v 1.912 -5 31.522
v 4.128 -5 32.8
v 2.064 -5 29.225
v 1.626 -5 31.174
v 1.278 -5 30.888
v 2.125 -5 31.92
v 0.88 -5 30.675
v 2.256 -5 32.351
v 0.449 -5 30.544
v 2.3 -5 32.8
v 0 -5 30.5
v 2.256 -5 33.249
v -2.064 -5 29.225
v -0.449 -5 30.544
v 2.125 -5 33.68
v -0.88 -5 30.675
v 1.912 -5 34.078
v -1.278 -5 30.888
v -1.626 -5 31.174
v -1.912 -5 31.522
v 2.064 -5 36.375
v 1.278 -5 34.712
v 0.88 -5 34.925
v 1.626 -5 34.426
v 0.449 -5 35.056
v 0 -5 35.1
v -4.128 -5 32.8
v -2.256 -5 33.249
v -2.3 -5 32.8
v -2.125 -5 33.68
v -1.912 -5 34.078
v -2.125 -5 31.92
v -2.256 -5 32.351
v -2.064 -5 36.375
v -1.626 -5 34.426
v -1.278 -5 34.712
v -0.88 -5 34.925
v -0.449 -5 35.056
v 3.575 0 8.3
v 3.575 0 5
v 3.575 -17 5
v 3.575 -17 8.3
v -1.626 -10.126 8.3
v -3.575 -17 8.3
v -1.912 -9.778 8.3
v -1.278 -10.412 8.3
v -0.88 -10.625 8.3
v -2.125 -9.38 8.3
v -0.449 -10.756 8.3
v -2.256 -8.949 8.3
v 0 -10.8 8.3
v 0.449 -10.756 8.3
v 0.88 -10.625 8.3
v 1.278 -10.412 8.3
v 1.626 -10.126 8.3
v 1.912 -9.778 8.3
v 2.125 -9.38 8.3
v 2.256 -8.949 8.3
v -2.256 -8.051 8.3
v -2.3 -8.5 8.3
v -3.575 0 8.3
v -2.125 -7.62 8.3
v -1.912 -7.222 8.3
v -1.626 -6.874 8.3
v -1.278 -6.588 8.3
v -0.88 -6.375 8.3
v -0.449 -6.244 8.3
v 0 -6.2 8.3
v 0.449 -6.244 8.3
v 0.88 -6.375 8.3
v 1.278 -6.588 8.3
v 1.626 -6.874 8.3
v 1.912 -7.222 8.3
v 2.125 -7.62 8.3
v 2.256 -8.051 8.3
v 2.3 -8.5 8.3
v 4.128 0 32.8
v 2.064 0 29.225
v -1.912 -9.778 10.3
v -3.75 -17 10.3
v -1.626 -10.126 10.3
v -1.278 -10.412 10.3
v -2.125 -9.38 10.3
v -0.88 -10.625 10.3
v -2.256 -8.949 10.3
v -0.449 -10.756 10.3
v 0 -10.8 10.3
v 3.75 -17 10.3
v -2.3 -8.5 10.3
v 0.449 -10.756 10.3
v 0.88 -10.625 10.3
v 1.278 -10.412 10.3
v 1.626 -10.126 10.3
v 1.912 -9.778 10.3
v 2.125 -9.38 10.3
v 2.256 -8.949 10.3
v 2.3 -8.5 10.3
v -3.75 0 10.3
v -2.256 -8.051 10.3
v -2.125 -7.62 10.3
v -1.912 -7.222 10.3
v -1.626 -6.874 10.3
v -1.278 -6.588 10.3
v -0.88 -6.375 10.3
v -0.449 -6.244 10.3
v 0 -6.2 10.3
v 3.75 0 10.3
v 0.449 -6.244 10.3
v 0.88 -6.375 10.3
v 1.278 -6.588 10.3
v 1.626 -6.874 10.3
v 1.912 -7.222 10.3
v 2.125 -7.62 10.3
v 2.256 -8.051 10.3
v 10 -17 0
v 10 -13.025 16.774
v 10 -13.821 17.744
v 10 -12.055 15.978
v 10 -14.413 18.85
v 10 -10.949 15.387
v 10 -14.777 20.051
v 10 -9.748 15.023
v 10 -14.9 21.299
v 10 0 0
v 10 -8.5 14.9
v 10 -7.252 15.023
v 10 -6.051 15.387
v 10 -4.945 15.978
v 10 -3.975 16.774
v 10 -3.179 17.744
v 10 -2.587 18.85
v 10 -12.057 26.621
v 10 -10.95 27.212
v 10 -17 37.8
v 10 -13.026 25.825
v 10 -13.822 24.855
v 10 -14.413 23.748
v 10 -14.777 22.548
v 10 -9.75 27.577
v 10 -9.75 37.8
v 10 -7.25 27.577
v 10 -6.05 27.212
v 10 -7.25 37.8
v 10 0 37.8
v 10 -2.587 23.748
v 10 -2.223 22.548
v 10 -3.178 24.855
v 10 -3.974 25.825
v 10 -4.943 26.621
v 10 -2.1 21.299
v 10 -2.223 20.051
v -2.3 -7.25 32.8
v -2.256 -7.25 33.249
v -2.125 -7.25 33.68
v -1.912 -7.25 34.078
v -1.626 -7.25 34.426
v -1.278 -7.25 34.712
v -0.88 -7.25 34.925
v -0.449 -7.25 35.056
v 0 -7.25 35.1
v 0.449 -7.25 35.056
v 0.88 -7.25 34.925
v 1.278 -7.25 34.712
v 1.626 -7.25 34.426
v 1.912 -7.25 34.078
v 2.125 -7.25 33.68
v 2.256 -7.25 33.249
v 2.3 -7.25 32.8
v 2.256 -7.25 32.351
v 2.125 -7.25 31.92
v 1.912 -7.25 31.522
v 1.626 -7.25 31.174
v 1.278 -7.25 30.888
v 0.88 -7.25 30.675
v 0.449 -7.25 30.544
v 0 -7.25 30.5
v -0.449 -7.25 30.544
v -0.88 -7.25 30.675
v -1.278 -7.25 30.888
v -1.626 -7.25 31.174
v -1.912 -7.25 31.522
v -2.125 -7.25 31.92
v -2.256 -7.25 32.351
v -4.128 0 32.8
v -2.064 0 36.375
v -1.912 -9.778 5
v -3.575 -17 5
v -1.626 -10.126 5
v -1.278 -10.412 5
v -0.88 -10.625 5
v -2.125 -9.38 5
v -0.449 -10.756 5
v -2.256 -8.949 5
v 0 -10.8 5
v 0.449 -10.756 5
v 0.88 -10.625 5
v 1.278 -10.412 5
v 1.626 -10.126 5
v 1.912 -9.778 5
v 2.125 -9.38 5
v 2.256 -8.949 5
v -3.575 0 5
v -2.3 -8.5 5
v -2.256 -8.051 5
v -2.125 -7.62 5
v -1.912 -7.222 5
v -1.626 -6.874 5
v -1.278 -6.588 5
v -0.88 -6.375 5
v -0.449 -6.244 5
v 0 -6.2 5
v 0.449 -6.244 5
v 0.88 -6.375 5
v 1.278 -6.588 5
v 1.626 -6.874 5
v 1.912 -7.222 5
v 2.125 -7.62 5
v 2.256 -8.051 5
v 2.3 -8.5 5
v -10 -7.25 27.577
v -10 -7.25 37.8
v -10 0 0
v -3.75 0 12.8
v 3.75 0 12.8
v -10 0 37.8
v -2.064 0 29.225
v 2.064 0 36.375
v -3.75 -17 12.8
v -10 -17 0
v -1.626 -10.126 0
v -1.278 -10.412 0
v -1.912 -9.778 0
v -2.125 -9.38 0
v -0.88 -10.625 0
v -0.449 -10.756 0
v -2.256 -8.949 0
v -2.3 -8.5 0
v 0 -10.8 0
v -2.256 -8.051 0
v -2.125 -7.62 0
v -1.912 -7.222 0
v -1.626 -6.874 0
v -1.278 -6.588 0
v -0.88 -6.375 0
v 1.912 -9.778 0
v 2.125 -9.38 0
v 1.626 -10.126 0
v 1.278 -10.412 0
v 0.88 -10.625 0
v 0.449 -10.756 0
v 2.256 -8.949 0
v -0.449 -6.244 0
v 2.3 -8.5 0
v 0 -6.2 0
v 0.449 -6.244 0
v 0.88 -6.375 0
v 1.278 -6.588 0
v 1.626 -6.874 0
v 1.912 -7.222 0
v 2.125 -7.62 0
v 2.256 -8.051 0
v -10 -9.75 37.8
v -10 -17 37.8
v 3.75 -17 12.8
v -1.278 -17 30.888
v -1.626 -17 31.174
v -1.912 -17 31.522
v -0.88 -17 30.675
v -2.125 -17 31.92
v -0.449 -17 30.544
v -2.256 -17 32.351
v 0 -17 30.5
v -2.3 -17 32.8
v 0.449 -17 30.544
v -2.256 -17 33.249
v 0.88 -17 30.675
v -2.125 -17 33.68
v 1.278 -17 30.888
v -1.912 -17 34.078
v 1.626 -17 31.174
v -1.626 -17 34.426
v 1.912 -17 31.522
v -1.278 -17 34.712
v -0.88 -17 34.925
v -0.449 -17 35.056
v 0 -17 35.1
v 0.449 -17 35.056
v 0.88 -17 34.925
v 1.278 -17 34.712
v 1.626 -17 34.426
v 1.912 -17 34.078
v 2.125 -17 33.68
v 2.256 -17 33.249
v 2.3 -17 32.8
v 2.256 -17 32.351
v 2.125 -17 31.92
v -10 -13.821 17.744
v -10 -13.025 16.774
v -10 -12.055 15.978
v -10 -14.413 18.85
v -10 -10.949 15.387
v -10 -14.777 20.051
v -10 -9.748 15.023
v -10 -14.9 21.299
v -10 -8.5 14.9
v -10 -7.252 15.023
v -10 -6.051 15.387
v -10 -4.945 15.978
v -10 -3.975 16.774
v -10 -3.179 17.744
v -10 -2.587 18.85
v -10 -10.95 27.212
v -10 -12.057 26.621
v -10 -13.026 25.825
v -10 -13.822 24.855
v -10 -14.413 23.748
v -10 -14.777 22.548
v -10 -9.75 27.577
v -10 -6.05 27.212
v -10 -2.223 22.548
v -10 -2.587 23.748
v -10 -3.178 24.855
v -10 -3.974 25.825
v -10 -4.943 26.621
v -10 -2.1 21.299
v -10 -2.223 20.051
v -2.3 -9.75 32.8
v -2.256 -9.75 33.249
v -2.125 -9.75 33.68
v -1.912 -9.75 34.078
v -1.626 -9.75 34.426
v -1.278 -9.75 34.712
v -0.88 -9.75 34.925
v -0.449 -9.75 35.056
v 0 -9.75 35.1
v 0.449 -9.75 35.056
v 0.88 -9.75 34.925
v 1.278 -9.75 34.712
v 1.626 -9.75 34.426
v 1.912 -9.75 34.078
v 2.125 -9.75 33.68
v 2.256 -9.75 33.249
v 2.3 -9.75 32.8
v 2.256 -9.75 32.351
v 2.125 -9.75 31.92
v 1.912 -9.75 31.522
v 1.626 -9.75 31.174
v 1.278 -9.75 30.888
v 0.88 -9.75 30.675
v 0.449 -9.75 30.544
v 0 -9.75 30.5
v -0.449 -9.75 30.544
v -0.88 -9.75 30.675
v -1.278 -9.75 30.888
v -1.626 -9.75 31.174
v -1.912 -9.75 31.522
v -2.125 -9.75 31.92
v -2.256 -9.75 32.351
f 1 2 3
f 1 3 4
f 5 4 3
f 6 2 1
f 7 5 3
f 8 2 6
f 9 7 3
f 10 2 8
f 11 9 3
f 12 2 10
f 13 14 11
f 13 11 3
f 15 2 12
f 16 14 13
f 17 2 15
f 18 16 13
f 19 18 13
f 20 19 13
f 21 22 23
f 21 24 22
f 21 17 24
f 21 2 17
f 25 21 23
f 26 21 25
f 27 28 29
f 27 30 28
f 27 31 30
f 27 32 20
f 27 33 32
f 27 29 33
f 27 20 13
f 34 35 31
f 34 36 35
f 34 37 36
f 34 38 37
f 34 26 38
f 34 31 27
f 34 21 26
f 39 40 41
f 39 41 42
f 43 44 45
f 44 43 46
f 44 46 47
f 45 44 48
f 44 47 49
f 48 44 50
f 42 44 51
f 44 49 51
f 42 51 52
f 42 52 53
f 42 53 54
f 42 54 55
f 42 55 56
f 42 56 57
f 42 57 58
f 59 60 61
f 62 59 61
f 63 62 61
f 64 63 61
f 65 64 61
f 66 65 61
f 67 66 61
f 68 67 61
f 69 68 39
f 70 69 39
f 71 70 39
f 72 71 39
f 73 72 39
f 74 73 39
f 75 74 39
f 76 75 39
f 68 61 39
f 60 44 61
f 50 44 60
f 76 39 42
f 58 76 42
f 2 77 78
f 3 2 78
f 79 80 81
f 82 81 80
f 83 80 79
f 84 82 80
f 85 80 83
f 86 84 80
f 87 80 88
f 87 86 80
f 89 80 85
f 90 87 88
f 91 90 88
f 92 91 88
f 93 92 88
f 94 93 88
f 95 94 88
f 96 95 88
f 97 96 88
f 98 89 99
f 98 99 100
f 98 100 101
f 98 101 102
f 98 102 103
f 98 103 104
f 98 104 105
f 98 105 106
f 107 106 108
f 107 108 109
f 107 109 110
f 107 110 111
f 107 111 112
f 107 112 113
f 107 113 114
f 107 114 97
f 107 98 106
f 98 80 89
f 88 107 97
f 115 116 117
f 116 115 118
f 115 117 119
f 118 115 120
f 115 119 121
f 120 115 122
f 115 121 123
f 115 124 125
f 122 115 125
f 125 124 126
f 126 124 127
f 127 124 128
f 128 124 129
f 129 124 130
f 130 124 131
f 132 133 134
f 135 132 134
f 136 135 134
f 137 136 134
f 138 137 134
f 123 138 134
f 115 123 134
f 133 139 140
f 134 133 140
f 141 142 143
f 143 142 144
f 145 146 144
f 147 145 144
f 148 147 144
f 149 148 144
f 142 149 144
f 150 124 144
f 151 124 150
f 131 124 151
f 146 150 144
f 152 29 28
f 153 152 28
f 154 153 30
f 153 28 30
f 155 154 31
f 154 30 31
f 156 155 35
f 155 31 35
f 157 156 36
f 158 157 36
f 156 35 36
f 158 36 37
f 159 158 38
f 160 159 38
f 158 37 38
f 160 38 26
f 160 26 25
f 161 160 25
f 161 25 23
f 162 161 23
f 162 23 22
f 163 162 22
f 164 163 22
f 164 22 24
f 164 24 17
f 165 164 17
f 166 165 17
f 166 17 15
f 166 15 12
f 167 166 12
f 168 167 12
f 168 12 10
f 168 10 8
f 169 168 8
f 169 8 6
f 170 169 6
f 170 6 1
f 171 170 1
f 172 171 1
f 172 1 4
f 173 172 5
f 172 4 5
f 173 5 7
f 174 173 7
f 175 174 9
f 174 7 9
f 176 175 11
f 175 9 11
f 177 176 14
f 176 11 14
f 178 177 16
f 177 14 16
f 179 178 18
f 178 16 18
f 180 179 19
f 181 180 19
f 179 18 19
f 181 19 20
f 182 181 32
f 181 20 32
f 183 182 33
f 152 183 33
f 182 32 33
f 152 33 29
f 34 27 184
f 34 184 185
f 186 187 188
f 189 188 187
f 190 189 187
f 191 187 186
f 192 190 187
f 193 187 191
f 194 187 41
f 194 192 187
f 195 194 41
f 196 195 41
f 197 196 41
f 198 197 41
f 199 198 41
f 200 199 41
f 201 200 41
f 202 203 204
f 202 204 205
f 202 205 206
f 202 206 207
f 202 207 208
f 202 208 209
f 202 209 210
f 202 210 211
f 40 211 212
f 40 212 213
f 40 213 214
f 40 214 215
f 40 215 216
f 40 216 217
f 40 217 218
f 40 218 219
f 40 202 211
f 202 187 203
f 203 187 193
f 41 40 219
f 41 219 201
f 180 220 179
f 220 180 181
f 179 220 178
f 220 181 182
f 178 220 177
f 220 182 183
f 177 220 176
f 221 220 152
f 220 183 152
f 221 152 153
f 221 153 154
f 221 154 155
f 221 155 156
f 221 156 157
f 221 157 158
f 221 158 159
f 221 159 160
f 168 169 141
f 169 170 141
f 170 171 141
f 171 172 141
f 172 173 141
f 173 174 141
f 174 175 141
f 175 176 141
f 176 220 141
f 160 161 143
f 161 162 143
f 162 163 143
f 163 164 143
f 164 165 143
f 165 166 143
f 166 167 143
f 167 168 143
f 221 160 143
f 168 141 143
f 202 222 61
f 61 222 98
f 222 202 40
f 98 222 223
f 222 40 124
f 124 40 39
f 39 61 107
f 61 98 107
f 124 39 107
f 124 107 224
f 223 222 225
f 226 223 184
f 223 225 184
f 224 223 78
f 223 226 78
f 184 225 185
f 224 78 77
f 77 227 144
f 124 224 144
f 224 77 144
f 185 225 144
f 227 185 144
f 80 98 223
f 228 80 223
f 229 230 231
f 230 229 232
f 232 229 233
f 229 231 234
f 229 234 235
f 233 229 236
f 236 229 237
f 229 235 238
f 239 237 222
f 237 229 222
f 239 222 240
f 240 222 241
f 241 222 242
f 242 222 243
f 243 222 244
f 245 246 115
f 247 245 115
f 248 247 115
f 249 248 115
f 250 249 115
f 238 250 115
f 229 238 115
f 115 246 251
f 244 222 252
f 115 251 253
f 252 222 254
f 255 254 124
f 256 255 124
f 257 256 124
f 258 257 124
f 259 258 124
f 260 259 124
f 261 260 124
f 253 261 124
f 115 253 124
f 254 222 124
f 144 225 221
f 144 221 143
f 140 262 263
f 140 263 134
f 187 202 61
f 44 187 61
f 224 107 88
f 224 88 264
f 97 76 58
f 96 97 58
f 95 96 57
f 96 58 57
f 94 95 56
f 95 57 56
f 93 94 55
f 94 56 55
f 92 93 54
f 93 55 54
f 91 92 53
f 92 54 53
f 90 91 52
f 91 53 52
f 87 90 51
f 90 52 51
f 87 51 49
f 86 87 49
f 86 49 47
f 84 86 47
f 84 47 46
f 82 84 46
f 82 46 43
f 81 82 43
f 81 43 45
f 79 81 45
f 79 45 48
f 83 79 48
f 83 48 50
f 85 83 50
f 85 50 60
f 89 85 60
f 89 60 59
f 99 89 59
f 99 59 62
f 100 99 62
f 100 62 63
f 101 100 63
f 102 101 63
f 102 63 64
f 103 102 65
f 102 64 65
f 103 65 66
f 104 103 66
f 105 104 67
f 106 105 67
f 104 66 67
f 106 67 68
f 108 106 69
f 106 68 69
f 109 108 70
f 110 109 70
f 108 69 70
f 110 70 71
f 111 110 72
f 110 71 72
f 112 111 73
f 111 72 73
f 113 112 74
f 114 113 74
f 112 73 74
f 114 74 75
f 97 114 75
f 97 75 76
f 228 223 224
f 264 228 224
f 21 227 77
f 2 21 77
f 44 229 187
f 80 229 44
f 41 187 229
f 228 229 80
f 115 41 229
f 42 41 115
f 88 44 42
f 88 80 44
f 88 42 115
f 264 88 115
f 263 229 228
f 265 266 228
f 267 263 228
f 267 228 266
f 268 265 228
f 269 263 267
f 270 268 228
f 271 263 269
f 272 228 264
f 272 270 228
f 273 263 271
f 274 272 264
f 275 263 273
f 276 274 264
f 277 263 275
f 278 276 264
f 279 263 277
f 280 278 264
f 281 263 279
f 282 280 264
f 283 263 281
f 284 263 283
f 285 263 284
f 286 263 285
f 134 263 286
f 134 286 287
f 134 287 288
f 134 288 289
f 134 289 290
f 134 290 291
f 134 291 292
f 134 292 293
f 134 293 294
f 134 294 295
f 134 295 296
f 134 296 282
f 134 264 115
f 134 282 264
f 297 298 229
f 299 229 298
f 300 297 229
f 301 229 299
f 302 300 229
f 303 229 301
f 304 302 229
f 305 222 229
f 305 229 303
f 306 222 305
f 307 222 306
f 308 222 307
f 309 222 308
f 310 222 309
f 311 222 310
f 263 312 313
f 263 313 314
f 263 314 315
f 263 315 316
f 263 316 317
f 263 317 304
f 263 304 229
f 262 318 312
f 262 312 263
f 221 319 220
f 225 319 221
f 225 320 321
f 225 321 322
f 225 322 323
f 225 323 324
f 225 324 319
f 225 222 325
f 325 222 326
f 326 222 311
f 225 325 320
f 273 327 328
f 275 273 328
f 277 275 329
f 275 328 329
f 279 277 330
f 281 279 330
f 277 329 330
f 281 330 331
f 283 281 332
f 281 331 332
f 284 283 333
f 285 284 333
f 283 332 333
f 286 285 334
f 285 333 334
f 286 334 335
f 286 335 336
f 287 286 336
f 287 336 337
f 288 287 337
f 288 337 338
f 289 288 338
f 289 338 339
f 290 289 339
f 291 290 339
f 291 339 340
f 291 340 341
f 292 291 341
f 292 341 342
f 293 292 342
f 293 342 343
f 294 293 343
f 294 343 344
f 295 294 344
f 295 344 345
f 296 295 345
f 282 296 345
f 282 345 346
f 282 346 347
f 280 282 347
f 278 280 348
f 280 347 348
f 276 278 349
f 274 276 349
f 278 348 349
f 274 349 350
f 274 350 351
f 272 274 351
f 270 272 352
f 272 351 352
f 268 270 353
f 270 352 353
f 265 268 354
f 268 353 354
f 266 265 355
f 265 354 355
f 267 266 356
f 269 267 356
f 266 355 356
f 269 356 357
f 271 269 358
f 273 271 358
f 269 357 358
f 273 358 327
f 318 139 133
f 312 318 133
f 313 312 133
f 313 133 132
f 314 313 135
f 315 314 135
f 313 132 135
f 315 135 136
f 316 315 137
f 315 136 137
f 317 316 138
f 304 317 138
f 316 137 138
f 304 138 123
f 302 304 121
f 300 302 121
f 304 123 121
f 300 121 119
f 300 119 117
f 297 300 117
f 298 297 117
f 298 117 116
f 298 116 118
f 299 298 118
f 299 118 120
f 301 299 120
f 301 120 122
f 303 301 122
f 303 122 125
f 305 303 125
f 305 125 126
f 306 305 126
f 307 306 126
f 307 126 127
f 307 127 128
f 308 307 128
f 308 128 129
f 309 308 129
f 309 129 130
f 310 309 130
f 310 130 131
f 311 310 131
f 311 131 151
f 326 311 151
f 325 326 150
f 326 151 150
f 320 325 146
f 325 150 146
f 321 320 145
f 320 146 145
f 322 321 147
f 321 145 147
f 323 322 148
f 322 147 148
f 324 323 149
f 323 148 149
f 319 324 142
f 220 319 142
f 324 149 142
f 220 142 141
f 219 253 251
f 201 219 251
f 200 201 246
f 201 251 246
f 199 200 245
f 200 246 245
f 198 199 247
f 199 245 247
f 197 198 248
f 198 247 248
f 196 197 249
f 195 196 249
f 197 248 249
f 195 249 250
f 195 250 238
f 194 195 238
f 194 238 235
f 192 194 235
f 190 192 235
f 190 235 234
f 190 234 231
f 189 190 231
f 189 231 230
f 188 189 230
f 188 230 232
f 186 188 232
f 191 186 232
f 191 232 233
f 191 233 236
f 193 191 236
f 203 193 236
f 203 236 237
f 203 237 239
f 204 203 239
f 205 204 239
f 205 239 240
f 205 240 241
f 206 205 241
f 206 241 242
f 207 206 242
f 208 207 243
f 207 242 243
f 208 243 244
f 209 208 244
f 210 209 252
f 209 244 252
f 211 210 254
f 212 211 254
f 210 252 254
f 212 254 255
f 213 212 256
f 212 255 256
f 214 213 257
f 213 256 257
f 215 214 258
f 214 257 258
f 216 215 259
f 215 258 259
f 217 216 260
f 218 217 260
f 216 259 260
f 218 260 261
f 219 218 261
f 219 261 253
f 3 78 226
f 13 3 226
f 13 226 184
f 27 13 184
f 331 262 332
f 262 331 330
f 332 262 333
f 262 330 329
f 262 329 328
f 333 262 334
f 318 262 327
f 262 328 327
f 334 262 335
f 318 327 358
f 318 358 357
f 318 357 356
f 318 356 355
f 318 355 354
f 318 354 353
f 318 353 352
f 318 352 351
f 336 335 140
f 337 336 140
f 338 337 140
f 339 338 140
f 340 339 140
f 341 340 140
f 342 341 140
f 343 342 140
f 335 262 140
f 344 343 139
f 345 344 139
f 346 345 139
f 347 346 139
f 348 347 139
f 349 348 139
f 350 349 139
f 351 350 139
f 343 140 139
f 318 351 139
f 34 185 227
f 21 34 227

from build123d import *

# Parameters (mm, degrees)
F0_W     = 20
F0_H     = 37.8
F0_W_2   = 7.15
F0_H_2   = 3.3
F0_W_3   = 7.5
F0_H_3   = 2.5
F1_DEPTH = 17
F3_DEPTH = 20.001
F4_R     = 2.3
F5_DEPTH = 17.001
F7_DEPTH = 5
F8_R     = 2.3
F9_DEPTH = 11


with BuildPart() as f1:
    # F0 (on Front) → F1 (new body)
    with BuildSketch(Plane.XZ):
        with Locations((0, 18.9)):
            Rectangle(F0_W, F0_H)
        with Locations((0, 6.65)):
            Rectangle(F0_W_2, F0_H_2, mode=Mode.SUBTRACT)
        with Locations((0, 11.55)):
            Rectangle(F0_W_3, F0_H_3, mode=Mode.SUBTRACT)
    extrude(amount=F1_DEPTH)

    # F2 (on face) → F3 (cut, through all)
    with BuildSketch(Plane.YZ.offset(10)):
        with BuildLine():
            Line((-9.75, 39.08921), (-9.75, 27.576743))
            ThreePointArc((-9.75, 27.576743), (-8.5, 14.9), (-7.25, 27.576743))
            Line((-7.25, 27.576743), (-7.25, 39.08921))
            Line((-7.25, 39.08921), (-9.75, 39.08921))
        make_face()
    extrude(amount=-F3_DEPTH, mode=Mode.SUBTRACT)

    # F4 (on face) → F5 (cut, through all)
    with BuildSketch(Plane(origin=(0, 0, 0), x_dir=(-1, 0, 0), z_dir=(0, 1, 0))):
        with Locations((0, 32.8)):
            Circle(F4_R)
    extrude(amount=-F5_DEPTH, mode=Mode.SUBTRACT)

    # F6 (on face) → F7 (cut)
    with BuildSketch(Plane(origin=(0, 0, 0), x_dir=(-1, 0, 0), z_dir=(0, 1, 0))):
        Polygon((4.128054, 32.8), (2.064027, 36.375), (-2.064027, 36.375), (-4.128054, 32.8), (-2.064027, 29.225), (2.064027, 29.225), align=None)
    extrude(amount=-F7_DEPTH, mode=Mode.SUBTRACT)

    # F8 (on face) → F9 (cut)
    with BuildSketch(Plane(origin=(0, 0, 0), x_dir=(1, 0, 0), z_dir=(0, 0, -1))):
        with Locations((0, 8.5)):
            Circle(F8_R)
    extrude(amount=-F9_DEPTH, mode=Mode.SUBTRACT)


solid = f1.part
